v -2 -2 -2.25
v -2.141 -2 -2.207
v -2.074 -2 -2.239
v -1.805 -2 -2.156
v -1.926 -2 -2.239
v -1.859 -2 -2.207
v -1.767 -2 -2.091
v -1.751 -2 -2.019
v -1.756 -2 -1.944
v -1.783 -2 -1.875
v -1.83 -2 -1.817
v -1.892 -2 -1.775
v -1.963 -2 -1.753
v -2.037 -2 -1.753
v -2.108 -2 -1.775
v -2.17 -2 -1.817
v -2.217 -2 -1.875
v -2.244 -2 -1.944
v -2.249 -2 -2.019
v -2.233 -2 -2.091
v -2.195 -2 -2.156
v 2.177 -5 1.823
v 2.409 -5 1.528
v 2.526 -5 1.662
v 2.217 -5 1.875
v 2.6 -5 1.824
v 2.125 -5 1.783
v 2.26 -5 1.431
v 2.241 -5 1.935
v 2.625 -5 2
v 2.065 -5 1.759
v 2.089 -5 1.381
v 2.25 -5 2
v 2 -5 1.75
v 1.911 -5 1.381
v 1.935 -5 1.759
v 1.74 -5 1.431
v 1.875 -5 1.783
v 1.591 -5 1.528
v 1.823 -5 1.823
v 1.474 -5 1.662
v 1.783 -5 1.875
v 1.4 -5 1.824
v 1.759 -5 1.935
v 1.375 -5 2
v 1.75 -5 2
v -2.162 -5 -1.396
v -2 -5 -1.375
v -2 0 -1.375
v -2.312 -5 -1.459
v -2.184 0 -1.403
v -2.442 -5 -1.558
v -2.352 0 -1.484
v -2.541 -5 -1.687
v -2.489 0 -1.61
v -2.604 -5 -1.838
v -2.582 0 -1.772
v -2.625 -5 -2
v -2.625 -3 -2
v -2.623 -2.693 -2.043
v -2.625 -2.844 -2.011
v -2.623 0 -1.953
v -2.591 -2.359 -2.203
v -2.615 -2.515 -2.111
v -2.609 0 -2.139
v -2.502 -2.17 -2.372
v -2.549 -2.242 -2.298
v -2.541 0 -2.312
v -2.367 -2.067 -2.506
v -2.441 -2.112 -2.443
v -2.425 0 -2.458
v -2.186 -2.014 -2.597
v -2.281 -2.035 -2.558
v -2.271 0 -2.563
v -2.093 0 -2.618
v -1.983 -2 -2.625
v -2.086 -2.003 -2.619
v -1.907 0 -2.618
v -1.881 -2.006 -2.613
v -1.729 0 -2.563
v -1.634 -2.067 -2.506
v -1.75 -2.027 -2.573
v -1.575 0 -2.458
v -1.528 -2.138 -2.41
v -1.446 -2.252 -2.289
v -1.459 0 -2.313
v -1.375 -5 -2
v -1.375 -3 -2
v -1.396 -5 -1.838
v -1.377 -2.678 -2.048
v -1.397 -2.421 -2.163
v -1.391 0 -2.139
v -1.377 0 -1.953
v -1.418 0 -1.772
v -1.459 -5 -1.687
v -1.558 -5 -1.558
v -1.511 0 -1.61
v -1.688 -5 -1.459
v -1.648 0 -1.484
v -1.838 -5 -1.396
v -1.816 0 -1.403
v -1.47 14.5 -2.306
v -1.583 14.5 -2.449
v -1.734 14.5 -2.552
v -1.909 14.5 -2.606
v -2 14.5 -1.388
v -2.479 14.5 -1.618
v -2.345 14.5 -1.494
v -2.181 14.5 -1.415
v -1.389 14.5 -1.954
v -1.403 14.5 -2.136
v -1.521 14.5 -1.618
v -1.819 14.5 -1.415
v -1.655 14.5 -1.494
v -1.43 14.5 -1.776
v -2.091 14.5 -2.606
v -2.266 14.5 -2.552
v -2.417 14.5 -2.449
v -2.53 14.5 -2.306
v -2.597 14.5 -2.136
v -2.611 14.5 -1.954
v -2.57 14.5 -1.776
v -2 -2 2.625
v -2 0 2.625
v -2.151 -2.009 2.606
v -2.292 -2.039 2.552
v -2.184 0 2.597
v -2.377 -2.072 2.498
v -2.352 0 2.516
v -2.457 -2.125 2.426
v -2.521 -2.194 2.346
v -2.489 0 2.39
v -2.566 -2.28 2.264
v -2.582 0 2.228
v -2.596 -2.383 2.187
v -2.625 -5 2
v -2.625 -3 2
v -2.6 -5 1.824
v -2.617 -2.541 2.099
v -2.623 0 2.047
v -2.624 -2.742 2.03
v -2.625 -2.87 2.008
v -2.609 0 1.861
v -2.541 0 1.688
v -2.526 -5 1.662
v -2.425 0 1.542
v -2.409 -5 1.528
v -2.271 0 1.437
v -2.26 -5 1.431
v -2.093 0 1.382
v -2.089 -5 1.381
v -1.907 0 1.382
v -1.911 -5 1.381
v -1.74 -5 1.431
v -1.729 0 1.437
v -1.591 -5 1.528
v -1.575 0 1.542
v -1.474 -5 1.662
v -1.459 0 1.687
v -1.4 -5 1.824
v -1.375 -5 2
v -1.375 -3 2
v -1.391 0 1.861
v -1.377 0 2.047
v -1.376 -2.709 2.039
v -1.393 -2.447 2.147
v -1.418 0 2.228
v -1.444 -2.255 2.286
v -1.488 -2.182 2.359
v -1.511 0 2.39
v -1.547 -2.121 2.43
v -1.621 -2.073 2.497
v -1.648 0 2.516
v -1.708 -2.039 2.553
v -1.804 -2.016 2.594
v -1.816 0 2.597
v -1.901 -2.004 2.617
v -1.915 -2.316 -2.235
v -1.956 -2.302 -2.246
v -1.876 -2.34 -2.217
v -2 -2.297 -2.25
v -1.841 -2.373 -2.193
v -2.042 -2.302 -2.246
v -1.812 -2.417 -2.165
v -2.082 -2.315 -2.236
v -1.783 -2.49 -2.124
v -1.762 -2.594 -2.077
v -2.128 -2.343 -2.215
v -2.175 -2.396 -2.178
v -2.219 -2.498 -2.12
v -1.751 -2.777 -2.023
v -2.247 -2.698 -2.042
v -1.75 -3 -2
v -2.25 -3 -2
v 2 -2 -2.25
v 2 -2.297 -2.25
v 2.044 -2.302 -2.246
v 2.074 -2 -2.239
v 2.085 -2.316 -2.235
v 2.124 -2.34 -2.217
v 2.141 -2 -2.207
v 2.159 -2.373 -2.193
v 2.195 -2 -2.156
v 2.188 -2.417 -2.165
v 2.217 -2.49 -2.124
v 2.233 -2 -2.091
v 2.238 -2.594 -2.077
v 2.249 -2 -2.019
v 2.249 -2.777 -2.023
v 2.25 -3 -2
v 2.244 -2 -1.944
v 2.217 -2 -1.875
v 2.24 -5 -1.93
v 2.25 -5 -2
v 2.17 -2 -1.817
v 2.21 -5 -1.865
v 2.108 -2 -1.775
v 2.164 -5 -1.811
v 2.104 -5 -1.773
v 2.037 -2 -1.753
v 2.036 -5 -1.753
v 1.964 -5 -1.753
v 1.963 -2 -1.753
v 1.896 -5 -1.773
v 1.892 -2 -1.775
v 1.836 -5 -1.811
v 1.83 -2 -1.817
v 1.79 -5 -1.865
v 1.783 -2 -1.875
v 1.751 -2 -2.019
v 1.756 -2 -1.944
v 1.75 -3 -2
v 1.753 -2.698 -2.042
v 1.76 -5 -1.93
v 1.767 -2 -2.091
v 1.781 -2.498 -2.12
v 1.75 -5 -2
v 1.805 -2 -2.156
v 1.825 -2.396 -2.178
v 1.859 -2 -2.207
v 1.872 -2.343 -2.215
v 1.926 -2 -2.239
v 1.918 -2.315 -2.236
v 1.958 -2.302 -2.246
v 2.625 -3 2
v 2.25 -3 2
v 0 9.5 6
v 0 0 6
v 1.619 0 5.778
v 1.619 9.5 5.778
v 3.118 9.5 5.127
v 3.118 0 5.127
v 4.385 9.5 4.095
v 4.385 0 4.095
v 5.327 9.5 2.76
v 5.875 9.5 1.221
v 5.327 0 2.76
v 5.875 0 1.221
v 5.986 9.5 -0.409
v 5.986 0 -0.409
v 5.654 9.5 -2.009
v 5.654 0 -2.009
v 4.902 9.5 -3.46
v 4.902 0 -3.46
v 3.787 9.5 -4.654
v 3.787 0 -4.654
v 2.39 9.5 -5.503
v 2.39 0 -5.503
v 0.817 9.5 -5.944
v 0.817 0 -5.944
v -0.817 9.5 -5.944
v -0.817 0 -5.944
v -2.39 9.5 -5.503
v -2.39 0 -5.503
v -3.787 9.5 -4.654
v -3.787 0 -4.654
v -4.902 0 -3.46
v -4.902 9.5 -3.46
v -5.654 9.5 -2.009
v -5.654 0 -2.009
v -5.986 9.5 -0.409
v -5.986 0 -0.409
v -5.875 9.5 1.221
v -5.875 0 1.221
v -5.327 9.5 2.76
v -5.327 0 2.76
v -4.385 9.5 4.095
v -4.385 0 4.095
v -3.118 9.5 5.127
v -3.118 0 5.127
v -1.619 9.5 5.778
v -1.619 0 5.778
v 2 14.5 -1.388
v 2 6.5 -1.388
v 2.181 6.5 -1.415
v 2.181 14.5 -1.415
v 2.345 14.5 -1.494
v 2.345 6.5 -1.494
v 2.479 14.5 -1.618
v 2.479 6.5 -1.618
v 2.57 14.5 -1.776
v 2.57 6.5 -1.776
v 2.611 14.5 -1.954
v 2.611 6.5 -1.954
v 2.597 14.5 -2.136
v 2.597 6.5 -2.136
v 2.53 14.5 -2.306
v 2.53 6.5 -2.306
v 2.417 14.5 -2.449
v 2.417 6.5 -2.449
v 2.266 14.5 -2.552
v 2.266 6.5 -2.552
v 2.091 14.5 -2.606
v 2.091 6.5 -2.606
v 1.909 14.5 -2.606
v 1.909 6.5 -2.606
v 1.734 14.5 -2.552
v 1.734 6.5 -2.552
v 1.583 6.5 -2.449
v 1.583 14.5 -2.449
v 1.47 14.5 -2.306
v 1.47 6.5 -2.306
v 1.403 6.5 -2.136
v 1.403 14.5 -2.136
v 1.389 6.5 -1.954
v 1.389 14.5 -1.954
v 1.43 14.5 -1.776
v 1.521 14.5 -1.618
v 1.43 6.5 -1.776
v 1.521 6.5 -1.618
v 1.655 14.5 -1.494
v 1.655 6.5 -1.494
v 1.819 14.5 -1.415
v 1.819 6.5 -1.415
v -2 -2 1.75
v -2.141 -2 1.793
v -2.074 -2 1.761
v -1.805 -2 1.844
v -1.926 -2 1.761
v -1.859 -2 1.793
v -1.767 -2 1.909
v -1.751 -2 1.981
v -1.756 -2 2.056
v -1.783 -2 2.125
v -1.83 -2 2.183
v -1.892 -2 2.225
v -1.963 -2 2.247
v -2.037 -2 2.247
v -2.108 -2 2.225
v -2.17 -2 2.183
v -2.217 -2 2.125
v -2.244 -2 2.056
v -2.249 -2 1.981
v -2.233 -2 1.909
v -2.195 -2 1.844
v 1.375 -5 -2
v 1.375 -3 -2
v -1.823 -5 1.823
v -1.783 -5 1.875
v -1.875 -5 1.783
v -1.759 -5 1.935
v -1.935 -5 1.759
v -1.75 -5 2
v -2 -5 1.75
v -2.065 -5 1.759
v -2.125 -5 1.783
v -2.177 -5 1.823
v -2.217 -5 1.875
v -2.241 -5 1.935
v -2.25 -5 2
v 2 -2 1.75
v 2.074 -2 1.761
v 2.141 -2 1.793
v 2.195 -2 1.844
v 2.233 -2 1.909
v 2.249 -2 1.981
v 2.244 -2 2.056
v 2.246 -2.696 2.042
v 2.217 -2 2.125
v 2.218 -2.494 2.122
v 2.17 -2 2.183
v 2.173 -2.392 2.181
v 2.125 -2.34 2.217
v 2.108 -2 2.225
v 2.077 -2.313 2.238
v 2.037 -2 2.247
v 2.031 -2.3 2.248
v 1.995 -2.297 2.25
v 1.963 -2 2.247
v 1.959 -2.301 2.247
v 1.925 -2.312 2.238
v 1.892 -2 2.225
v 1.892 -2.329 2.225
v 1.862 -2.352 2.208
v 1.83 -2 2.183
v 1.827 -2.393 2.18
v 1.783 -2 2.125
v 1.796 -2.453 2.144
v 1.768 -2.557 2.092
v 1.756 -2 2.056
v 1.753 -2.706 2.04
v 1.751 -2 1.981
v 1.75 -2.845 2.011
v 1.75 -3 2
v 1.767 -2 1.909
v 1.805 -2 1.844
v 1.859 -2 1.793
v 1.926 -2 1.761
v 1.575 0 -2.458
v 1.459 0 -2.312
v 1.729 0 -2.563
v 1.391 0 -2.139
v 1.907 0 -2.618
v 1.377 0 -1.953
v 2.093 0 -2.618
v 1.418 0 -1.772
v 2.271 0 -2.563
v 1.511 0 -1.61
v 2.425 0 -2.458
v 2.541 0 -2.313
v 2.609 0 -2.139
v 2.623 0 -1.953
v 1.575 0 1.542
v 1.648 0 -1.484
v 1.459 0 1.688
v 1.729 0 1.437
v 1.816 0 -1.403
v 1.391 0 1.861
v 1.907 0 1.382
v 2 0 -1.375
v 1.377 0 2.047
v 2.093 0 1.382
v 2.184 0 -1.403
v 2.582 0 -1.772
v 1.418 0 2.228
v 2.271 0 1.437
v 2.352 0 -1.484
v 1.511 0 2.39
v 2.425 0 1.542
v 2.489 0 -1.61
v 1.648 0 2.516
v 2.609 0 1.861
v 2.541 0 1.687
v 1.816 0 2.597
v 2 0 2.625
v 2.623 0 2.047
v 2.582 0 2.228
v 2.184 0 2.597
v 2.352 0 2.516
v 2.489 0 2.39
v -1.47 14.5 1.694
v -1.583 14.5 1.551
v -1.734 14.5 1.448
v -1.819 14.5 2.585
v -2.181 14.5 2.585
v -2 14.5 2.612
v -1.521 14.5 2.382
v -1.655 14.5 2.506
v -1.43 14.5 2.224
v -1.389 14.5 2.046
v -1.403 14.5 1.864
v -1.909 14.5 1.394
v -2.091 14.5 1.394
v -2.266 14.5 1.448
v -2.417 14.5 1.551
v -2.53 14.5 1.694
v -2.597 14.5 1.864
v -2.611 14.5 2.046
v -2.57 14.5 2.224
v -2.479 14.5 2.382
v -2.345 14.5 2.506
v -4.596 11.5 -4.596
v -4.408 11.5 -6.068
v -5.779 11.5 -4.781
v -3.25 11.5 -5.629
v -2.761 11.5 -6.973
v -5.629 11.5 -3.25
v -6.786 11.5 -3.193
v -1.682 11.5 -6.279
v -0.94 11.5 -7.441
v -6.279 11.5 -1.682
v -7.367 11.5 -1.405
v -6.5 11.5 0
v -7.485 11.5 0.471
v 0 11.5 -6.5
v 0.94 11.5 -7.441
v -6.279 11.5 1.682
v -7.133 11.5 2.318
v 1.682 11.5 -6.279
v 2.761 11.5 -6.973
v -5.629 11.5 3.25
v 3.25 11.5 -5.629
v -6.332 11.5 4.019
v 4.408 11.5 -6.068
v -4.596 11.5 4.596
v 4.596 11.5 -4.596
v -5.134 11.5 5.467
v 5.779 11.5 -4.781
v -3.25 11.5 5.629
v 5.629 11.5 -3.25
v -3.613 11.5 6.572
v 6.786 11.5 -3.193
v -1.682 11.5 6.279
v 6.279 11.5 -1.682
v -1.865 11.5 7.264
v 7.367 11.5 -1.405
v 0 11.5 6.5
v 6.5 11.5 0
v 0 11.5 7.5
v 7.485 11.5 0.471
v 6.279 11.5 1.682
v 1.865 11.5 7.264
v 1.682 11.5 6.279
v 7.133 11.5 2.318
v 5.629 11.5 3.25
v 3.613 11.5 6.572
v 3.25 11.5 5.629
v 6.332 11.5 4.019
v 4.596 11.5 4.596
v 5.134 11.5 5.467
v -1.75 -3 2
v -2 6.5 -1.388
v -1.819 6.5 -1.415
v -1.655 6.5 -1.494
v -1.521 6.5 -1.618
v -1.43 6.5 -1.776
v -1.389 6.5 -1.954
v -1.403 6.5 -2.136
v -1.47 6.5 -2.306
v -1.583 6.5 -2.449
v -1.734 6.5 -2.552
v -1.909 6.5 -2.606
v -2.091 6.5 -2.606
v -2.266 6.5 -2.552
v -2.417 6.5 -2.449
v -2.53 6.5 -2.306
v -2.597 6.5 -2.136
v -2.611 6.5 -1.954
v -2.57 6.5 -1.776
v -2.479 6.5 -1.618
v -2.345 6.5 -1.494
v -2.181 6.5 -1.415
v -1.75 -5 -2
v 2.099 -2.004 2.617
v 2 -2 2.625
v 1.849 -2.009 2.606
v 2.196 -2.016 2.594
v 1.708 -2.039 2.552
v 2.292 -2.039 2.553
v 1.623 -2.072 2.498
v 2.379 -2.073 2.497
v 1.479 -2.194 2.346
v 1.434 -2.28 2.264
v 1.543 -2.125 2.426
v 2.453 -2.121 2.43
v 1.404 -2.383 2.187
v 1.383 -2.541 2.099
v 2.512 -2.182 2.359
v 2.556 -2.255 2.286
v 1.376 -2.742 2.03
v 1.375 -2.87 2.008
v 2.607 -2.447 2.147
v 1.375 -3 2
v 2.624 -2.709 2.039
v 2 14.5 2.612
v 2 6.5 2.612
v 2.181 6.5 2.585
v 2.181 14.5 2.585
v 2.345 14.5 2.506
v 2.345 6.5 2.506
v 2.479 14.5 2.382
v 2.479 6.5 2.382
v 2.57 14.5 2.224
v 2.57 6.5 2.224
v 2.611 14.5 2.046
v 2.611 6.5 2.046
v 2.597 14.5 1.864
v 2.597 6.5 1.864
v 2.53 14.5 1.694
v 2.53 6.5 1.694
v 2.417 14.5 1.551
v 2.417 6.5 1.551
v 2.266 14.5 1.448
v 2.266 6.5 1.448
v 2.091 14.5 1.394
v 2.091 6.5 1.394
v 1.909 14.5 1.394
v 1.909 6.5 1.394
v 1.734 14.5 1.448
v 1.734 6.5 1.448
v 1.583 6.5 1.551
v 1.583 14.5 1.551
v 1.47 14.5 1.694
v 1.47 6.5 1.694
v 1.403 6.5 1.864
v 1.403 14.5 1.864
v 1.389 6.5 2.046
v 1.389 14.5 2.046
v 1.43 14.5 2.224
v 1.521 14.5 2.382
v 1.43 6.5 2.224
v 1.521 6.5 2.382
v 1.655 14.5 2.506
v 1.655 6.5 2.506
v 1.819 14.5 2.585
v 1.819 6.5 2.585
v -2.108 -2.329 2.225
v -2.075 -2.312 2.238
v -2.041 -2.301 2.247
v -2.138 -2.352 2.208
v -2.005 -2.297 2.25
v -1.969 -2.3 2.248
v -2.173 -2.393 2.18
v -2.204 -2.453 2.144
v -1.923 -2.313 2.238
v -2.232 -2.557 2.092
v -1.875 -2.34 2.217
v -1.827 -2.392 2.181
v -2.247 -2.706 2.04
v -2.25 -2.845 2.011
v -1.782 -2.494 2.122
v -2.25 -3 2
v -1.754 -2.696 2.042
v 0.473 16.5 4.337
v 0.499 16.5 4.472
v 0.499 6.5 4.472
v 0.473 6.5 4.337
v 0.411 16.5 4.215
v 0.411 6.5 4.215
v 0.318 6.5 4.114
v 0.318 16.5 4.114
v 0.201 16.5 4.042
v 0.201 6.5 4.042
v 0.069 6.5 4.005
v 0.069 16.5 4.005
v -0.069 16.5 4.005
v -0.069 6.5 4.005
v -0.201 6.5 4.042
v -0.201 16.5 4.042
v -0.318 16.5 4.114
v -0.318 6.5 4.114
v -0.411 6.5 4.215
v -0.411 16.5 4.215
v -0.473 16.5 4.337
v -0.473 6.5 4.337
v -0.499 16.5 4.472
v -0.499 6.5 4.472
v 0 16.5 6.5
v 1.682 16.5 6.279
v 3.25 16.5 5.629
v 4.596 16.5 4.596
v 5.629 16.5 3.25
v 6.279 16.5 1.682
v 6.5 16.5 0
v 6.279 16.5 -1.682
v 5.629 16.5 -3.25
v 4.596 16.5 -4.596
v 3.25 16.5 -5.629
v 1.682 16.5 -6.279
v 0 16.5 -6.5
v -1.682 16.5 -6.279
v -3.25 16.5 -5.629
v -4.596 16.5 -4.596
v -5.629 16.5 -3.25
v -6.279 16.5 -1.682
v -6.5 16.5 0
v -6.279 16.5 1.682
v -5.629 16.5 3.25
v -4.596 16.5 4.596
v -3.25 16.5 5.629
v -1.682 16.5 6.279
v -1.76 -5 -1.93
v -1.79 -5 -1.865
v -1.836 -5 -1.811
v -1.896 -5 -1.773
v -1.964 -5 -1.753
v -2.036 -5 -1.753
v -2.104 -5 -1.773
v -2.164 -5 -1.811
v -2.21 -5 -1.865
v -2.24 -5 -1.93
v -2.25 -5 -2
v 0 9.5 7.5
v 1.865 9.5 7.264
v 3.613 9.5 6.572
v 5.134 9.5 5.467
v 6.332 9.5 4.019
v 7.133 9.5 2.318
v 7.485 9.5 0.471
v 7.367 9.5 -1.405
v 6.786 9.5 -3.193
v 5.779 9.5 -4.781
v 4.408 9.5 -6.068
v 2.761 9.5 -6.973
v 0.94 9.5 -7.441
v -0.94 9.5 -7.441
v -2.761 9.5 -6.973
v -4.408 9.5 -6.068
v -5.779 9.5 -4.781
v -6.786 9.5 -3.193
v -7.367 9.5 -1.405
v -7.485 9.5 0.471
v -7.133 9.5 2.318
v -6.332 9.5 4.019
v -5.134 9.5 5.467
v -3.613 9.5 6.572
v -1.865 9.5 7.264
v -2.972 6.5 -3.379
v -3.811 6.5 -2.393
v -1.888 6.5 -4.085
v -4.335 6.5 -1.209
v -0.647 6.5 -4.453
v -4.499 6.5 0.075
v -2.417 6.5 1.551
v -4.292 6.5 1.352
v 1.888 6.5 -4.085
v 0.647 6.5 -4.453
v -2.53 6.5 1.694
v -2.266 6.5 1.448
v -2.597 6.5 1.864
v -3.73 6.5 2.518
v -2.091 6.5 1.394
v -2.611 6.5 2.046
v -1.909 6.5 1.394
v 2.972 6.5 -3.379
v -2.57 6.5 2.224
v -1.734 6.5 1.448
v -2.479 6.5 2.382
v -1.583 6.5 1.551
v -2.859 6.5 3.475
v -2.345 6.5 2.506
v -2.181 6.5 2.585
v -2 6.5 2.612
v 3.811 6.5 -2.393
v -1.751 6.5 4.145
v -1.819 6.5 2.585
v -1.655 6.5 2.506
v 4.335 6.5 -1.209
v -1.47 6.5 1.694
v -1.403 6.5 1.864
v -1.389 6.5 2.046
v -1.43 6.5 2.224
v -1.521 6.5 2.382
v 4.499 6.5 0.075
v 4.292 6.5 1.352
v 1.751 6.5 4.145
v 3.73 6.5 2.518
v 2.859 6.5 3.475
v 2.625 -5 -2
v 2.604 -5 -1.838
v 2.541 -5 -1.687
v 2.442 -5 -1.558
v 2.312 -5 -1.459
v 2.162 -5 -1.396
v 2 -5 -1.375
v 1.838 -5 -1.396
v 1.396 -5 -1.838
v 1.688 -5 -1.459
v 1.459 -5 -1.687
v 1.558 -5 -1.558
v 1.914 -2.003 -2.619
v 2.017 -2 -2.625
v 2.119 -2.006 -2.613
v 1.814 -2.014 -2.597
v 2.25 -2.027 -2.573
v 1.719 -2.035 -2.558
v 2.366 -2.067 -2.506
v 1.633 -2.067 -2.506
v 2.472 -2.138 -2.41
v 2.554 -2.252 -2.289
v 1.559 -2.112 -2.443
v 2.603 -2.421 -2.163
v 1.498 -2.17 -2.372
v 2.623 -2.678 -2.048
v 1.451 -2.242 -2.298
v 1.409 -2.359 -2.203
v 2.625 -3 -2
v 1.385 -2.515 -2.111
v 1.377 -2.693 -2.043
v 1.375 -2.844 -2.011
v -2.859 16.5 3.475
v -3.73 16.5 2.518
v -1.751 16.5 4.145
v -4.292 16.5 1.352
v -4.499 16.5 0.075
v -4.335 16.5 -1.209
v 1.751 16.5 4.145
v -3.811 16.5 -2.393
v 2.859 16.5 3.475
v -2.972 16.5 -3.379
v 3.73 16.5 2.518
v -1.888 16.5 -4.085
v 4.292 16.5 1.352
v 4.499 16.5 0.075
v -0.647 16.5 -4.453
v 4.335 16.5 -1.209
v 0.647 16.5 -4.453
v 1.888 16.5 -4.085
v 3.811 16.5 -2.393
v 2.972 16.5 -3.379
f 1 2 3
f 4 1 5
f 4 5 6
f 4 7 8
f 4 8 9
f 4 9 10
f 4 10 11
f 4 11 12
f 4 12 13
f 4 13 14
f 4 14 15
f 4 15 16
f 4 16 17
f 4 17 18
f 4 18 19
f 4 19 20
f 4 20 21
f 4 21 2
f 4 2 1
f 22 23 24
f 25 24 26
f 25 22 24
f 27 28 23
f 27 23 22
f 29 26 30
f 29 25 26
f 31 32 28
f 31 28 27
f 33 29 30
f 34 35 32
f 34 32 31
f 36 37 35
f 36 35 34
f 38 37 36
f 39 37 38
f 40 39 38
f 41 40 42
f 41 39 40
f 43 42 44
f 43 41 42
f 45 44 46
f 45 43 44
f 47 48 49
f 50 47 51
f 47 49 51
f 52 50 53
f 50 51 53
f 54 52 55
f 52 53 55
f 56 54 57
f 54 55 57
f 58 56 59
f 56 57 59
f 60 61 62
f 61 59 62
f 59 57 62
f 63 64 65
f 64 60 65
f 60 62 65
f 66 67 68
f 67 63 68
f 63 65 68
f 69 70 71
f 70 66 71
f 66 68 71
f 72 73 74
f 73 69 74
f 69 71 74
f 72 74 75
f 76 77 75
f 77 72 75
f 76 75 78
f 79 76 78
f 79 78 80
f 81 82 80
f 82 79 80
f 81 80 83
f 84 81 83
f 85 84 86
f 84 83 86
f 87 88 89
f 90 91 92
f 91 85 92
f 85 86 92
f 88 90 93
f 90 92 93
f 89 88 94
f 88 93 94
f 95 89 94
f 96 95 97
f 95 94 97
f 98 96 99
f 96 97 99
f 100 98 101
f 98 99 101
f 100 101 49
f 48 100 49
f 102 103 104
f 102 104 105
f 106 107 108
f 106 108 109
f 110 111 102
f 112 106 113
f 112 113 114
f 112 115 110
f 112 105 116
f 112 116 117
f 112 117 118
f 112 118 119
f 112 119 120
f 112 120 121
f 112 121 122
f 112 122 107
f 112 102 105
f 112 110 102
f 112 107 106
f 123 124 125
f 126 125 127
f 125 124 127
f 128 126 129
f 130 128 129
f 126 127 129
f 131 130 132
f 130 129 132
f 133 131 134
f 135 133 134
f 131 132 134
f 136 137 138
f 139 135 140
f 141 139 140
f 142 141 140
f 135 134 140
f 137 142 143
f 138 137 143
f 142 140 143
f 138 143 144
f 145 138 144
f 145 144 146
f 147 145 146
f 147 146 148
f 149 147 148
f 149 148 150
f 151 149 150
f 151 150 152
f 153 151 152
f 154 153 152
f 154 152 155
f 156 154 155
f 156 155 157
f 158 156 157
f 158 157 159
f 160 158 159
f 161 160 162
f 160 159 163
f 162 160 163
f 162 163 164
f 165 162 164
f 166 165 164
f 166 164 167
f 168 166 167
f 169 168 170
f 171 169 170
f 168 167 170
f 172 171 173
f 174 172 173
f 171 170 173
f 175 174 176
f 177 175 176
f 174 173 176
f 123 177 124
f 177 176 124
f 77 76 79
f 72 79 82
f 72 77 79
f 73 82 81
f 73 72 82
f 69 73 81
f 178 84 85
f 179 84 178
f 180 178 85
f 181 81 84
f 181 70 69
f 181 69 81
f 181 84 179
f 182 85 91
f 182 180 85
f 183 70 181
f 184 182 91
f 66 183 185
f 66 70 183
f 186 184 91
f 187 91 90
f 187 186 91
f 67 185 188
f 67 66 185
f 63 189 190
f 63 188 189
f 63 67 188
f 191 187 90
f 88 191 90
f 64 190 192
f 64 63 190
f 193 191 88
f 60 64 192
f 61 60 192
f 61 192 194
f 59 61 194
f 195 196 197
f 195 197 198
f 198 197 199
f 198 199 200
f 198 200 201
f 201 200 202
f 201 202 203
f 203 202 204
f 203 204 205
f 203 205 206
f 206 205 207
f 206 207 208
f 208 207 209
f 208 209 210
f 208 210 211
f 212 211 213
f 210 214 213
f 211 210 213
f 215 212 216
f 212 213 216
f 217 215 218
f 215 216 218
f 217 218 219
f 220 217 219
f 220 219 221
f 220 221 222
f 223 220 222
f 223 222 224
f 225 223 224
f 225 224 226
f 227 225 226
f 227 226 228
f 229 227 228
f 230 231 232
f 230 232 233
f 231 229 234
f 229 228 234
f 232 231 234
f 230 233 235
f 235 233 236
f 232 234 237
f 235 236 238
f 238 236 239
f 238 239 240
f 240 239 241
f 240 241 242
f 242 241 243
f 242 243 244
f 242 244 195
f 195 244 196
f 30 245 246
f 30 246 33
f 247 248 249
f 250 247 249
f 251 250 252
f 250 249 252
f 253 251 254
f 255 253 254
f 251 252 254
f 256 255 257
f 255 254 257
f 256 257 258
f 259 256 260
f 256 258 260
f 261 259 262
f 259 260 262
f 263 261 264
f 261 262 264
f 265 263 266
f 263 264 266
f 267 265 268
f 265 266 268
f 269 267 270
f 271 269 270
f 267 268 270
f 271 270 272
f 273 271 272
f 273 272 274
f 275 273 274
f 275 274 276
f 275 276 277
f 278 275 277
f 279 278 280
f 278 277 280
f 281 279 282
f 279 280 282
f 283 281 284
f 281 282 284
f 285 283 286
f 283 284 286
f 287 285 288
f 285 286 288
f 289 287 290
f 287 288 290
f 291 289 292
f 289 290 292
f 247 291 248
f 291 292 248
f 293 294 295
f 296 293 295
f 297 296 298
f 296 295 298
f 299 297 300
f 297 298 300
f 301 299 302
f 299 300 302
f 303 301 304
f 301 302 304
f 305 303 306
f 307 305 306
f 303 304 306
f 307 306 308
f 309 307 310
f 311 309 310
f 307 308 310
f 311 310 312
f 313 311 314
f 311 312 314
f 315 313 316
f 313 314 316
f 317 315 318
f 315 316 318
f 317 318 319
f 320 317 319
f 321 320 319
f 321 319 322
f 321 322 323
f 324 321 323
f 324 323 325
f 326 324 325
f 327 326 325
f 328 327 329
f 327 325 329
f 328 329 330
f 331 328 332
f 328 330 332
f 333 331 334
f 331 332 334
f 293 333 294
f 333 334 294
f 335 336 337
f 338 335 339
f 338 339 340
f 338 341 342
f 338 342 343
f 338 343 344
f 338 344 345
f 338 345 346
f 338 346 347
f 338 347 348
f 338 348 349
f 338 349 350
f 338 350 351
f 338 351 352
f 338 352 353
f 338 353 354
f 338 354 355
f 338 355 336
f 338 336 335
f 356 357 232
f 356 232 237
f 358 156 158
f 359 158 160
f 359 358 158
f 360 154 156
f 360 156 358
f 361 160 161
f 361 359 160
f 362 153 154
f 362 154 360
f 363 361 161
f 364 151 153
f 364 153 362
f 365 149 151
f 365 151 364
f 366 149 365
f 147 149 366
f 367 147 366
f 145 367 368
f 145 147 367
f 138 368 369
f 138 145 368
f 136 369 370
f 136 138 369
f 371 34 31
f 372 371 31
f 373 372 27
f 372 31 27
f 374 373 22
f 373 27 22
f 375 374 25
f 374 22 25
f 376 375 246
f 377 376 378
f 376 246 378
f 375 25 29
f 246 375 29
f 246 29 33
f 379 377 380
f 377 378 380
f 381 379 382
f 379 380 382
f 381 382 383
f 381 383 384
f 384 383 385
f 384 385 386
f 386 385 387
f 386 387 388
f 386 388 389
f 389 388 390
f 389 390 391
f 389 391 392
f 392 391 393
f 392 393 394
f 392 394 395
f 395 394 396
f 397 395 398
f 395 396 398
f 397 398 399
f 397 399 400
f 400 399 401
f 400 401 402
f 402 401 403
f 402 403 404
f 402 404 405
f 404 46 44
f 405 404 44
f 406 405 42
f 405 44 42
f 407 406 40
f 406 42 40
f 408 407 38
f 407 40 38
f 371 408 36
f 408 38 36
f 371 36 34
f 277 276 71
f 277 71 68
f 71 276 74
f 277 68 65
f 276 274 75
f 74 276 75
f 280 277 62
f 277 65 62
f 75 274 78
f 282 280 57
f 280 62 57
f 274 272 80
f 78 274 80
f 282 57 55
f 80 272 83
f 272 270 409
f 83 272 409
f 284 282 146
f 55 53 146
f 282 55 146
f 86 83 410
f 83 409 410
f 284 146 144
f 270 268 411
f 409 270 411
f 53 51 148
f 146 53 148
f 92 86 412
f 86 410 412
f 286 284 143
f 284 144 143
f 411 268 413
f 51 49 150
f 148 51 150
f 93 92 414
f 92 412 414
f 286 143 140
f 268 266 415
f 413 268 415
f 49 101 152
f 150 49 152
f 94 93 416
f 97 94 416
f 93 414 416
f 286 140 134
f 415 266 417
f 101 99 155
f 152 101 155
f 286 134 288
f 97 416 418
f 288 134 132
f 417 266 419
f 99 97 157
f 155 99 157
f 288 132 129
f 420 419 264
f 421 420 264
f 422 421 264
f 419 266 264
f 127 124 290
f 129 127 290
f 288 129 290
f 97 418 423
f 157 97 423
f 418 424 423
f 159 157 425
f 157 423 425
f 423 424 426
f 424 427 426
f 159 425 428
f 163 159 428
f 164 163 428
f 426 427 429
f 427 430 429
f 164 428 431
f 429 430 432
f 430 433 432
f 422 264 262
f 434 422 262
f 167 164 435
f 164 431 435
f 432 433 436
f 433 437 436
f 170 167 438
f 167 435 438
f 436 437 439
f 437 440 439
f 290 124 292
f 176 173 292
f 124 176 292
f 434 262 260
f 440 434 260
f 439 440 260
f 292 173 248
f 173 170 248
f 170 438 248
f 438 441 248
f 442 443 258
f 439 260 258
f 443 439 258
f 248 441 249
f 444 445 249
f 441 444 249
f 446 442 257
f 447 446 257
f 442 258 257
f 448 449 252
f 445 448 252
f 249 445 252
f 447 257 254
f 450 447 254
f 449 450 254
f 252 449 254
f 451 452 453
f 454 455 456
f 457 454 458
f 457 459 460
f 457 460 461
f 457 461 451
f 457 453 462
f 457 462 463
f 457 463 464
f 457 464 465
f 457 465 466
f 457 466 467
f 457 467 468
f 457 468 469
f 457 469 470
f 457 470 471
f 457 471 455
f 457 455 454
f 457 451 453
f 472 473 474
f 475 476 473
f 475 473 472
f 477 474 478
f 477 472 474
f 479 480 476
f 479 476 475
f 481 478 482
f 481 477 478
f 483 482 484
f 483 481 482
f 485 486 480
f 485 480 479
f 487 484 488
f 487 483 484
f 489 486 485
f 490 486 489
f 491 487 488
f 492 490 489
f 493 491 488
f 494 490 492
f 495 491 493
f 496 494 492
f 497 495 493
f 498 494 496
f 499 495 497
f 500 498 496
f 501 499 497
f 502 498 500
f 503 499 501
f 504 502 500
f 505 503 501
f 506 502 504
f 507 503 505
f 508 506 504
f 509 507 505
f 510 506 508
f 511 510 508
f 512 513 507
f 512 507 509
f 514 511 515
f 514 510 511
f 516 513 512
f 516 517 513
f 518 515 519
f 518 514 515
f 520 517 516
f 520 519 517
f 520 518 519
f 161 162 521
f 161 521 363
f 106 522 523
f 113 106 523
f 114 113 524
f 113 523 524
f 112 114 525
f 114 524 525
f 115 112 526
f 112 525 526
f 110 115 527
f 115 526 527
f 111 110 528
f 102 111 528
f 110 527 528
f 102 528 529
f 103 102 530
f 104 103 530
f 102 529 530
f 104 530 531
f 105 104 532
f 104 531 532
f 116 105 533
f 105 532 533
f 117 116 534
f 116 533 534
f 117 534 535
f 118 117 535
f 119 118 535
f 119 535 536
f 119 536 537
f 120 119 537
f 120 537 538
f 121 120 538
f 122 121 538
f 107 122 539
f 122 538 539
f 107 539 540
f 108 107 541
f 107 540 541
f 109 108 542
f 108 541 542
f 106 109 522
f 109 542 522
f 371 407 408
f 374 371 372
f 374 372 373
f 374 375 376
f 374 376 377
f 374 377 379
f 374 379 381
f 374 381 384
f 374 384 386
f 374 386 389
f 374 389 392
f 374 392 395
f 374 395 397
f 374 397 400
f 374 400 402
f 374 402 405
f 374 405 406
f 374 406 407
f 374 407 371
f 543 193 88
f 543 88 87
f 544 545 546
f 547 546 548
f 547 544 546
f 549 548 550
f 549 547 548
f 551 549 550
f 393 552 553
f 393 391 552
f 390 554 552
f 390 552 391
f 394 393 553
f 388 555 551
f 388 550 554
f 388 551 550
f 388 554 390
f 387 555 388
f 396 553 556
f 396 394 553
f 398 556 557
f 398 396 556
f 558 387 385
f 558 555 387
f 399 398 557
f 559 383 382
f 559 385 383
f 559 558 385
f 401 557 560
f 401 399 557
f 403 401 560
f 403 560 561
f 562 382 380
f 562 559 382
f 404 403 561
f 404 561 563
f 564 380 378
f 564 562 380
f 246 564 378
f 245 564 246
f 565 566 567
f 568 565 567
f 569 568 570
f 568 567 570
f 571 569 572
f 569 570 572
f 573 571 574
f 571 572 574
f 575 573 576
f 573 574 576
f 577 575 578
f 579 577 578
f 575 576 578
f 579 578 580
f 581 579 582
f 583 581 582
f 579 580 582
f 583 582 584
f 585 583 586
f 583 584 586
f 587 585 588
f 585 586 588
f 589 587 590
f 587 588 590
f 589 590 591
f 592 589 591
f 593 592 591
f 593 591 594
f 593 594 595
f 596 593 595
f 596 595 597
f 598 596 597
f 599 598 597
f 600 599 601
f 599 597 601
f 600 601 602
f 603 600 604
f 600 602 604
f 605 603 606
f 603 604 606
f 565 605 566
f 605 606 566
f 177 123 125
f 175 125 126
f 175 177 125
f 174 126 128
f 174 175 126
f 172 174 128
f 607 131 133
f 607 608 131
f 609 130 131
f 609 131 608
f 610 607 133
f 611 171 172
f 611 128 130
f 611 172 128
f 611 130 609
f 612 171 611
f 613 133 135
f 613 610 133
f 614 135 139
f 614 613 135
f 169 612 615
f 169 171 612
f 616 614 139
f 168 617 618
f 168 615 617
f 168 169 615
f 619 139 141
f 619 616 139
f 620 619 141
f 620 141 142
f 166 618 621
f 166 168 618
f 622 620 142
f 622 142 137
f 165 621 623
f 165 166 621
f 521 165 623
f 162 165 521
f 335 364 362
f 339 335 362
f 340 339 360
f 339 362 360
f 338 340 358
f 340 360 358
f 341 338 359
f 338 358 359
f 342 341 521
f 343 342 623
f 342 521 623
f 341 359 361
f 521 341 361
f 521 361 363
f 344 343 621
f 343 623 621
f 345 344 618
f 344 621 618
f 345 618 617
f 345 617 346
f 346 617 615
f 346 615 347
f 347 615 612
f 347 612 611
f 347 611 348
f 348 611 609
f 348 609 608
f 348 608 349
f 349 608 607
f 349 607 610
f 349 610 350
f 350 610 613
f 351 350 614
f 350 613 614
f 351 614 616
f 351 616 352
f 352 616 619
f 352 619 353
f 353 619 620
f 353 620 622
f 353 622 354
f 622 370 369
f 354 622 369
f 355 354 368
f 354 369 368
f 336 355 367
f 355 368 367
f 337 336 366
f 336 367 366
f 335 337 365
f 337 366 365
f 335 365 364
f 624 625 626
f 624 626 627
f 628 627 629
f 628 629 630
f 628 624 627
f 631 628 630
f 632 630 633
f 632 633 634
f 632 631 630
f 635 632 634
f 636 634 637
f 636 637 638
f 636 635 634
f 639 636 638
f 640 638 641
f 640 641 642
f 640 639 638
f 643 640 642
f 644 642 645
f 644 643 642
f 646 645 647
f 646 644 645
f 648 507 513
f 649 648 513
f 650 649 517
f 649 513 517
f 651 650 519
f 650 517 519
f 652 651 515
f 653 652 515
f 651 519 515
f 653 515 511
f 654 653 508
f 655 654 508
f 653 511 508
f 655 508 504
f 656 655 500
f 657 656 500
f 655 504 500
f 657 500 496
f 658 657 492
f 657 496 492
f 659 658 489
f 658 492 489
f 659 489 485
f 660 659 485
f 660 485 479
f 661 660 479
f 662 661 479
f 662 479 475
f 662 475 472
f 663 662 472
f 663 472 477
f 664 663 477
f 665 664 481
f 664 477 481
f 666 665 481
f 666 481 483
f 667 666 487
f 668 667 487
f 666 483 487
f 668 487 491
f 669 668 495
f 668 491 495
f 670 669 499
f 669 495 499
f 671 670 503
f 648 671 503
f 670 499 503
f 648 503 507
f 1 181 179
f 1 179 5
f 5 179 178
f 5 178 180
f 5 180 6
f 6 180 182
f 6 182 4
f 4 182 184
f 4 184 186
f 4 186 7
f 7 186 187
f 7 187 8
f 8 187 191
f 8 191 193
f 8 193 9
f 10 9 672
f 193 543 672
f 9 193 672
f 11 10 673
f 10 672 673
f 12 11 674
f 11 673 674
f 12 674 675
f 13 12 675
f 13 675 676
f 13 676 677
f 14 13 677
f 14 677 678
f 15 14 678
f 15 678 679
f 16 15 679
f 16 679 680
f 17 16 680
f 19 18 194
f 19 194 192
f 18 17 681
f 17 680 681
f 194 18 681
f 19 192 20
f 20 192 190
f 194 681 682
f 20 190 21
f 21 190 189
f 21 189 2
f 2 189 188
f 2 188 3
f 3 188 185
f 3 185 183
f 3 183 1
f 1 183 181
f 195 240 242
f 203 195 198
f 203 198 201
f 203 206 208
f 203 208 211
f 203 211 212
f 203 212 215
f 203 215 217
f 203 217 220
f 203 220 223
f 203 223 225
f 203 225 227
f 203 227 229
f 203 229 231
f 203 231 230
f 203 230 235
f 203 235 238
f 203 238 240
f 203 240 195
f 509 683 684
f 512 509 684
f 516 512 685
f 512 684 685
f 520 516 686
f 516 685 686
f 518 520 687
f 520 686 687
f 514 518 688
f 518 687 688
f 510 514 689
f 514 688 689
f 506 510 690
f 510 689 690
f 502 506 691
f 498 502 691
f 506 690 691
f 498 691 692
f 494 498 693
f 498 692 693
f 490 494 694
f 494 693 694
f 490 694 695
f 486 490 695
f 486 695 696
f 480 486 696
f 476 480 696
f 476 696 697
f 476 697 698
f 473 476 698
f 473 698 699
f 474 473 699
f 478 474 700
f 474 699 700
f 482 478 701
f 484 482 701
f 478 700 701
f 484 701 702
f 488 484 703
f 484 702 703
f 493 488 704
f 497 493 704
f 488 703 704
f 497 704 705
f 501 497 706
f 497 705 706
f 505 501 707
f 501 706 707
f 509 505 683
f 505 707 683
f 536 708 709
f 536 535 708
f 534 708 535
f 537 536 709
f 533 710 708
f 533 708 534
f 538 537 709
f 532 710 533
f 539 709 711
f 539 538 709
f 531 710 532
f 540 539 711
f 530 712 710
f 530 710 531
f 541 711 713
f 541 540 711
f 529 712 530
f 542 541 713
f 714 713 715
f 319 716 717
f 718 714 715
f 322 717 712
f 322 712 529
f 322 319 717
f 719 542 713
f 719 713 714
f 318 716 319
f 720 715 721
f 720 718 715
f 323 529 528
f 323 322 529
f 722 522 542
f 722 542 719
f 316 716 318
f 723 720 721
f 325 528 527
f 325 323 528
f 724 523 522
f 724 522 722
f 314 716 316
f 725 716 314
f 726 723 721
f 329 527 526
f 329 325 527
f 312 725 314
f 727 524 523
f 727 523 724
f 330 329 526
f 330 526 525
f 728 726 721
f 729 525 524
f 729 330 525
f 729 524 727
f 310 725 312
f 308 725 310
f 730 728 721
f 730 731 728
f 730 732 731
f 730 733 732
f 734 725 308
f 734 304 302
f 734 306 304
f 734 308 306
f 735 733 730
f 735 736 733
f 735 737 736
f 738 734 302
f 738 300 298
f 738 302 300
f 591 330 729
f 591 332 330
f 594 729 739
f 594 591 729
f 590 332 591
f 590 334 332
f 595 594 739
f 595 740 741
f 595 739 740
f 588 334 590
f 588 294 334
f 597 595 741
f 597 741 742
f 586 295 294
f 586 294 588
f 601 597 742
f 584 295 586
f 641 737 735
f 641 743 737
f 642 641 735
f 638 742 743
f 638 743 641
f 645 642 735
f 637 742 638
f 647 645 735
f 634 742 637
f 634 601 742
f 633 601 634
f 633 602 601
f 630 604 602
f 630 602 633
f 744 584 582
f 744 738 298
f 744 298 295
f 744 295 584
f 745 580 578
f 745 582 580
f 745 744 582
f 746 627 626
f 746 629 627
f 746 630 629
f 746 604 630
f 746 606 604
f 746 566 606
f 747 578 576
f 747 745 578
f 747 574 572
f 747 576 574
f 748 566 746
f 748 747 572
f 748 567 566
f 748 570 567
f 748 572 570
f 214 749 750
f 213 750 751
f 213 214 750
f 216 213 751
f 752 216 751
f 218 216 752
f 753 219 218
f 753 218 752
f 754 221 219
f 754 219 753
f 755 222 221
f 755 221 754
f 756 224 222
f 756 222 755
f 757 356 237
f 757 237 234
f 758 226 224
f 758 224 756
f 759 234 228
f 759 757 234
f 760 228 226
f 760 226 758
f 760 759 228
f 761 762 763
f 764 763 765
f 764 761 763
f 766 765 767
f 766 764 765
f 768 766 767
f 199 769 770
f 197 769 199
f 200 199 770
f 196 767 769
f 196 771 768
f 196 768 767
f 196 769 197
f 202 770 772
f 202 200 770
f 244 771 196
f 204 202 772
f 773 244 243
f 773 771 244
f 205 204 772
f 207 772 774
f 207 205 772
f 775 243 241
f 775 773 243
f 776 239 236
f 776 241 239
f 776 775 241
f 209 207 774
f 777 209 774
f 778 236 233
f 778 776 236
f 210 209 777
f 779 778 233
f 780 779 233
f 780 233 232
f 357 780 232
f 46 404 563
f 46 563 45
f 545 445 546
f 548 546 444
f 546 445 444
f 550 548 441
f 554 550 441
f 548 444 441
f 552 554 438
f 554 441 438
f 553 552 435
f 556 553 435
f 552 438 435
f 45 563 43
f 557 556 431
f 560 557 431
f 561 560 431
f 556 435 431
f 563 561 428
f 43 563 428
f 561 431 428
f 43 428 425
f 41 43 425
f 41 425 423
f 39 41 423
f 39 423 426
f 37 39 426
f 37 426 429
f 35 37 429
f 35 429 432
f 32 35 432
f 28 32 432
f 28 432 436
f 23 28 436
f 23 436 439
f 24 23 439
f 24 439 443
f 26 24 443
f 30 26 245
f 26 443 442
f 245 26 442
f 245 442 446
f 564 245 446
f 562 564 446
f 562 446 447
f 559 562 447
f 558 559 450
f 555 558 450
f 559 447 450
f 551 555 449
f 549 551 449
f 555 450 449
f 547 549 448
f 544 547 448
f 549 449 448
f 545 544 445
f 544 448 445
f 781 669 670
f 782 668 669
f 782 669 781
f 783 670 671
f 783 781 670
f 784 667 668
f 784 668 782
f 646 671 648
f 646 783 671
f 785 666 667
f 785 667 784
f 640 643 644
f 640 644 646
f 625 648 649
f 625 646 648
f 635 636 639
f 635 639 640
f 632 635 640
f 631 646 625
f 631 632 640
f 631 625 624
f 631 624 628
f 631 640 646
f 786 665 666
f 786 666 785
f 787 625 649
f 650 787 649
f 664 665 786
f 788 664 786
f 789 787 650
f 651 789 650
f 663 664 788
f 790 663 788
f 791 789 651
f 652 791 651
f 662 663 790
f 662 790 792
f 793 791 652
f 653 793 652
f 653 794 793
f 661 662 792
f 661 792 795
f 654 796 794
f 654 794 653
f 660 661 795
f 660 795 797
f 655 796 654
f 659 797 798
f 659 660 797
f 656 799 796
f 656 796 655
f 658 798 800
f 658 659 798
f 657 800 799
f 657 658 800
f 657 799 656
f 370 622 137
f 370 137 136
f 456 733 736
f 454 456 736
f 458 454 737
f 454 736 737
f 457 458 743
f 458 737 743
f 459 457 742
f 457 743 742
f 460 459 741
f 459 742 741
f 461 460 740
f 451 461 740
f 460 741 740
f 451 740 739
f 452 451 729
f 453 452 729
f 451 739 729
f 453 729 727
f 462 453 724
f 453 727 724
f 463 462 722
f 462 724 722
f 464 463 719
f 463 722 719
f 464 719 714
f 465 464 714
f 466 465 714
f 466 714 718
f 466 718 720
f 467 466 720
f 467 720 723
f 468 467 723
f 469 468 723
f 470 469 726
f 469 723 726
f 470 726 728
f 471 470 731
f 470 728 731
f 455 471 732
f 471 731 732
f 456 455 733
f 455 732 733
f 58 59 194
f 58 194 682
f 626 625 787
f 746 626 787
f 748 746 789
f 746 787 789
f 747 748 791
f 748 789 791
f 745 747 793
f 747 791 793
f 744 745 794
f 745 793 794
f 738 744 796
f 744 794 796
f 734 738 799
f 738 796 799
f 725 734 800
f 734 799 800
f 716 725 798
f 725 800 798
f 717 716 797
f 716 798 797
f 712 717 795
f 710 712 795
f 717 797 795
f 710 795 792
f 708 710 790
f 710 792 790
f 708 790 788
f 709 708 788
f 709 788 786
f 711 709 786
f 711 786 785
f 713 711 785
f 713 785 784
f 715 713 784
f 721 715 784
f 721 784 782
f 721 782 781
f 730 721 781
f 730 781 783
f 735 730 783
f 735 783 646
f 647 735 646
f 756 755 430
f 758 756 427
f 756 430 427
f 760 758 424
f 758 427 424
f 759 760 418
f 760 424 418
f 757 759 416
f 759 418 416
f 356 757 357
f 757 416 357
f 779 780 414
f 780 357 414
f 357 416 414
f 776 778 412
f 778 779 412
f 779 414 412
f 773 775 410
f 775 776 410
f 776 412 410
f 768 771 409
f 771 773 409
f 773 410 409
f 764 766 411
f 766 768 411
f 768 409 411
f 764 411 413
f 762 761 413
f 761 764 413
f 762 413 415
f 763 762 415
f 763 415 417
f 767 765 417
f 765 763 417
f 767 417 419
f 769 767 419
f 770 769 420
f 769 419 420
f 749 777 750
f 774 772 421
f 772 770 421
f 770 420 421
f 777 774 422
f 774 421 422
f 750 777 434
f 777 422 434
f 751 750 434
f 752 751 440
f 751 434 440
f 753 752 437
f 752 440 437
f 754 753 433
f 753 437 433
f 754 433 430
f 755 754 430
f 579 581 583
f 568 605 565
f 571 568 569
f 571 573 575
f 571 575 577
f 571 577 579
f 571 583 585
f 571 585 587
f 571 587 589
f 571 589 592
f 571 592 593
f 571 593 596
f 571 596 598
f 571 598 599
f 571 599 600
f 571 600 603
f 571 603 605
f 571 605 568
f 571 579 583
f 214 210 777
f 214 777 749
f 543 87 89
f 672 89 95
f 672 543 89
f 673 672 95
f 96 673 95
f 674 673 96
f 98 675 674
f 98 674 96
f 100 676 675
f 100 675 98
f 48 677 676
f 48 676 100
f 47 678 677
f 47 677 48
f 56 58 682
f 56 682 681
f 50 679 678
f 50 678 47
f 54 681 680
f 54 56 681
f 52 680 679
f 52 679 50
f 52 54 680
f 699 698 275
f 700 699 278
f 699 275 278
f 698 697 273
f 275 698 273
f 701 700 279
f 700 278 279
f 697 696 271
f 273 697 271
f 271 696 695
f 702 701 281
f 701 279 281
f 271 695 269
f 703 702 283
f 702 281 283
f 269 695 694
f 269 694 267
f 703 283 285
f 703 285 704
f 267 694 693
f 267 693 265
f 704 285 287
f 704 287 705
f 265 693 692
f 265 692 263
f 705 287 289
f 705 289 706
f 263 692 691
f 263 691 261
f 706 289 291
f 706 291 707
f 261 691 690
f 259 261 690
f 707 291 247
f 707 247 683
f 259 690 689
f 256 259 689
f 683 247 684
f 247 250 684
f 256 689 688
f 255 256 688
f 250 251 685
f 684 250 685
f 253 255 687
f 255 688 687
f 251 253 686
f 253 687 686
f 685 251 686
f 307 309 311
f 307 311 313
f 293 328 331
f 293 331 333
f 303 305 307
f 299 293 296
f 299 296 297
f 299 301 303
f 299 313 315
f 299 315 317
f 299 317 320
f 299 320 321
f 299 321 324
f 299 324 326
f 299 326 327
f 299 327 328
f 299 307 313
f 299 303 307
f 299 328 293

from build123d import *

# Parameters (mm, degrees)
SKETCH_1_R          = 6
EXTRUDE_1_DEPTH     = 9.5
SKETCH_2_R          = 7.5
EXTRUDE_2_DEPTH     = 2
SKETCH_3_R          = 6.5
EXTRUDE_3_DEPTH     = 5
SKETCH_4_R          = 4.5
CUT_EXTRUDE_1_DEPTH = 10
EXTRUDE_START       = 10
EXTRUDE_4_DEPTH     = 10
SKETCH_6_R          = 0.6125
EXTRUDE_5_DEPTH     = 8
SKETCH_7_R          = 0.625
EXTRUDE_6_DEPTH     = 5
SKETCH_8_R          = 0.25
CUT_EXTRUDE_2_DEPTH = 3
CUT_EXTRUDE_3_DEPTH = 10


with BuildPart() as part:
    # Эскиз1 → Бобышка-Вытянуть1 (new body)
    with BuildSketch(Plane(origin=(0, 0, 0), x_dir=(1, 0, 0), z_dir=(0, 1, 0))):
        with Locations(Location((0, 0, 0), (0, 0, 270))):
            Circle(SKETCH_1_R)
    extrude(amount=EXTRUDE_1_DEPTH)

    # Эскиз2 → Бобышка-Вытянуть2 (add)
    with BuildSketch(Plane(origin=(0, 9.5, 0), x_dir=(1, 0, 0), z_dir=(0, 1, 0))):
        with Locations(Location((0, 0, 0), (0, 0, 270))):
            Circle(SKETCH_2_R)
    extrude(amount=EXTRUDE_2_DEPTH)

    # Эскиз3 → Бобышка-Вытянуть3 (add)
    with BuildSketch(Plane(origin=(0, 11.5, 0), x_dir=(1, 0, 0), z_dir=(0, 1, 0))):
        with Locations(Location((0, 0, 0), (0, 0, 270))):
            Circle(SKETCH_3_R)
    extrude(amount=EXTRUDE_3_DEPTH)

    # Эскиз4 → Вырез-Вытянуть1 (cut)
    with BuildSketch(Plane(origin=(0, 16.5, 0), x_dir=(1, 0, 0), z_dir=(0, 1, 0))):
        with Locations(Location((0, 0, 0), (0, 0, 270))):
            Circle(SKETCH_4_R)
    extrude(amount=-CUT_EXTRUDE_1_DEPTH, mode=Mode.SUBTRACT)

    # Эскиз5 → Бобышка-Вытянуть4 (add)
    with BuildSketch(Plane(origin=(0, 6.5, 0), x_dir=(1, 0, 0), z_dir=(0, 1, 0)).offset(EXTRUDE_START)):
        with BuildLine():
            ThreePointArc((-0.499227799, -4.472222222), (0, -4.5), (0.499227799, -4.472222222))
            ThreePointArc((0.499227799, -4.472222222), (0, -4), (-0.499227799, -4.472222222))
        make_face()
    extrude(amount=-EXTRUDE_4_DEPTH)

    # Эскиз6 → Бобышка-Вытянуть5 (add)
    with BuildSketch(Plane(origin=(0, 6.5, 0), x_dir=(1, 0, 0), z_dir=(0, 1, 0))):
        with Locations(Location((-2, 2, 0), (0, 0, 270))):
            Circle(SKETCH_6_R)
        with Locations(Location((-2, -2, 0), (0, 0, 270))):
            Circle(SKETCH_6_R)
        with Locations(Location((2, -2, 0), (0, 0, 270))):
            Circle(SKETCH_6_R)
        with Locations(Location((2, 2, 0), (0, 0, 270))):
            Circle(SKETCH_6_R)
    extrude(amount=EXTRUDE_5_DEPTH)

    # Эскиз7 → Бобышка-Вытянуть6 (add)
    with BuildSketch(Plane.XZ):
        with Locations(Location((2, -2, 0), (0, 0, 90))):
            Circle(SKETCH_7_R)
        with Locations(Location((-2, -2, 0), (0, 0, 90))):
            Circle(SKETCH_7_R)
        with Locations(Location((-2, 2, 0), (0, 0, 90))):
            Circle(SKETCH_7_R)
        with Locations(Location((2, 2, 0), (0, 0, 90))):
            Circle(SKETCH_7_R)
    extrude(amount=EXTRUDE_6_DEPTH)

    # Эскиз8 → Вырез-Вытянуть2 (cut)
    with BuildSketch(Plane.XZ.offset(5)):
        with Locations(Location((2, -2, 0), (0, 0, 270))):
            Circle(SKETCH_8_R)
        with Locations(Location((-2, -2, 0), (0, 0, 270))):
            Circle(SKETCH_8_R)
        with Locations(Location((-2, 2, 0), (0, 0, 270))):
            Circle(SKETCH_8_R)
        with Locations(Location((2, 2, 0), (0, 0, 270))):
            Circle(SKETCH_8_R)
    extrude(amount=-CUT_EXTRUDE_2_DEPTH, mode=Mode.SUBTRACT)

    # Эскиз9 → Вырез-Вытянуть3 (cut, symmetric)
    with BuildSketch(Plane(origin=(0, 0, 0), x_dir=(0, 0, -1), z_dir=(1, 0, 0))):
        with BuildLine():
            Line((2, -5), (2.625, -5))
            Line((2.625, -5), (2.625, -2))
            ThreePointArc((2.625, -2), (2.169101887, -2.410376179), (2, -3))
            Line((2, -3), (2, -5))
        make_face()
        with BuildLine():
            Line((-2, -5), (-2.625, -5))
            Line((-2.625, -5), (-2.625, -2))
            ThreePointArc((-2.625, -2), (-2.169101887, -2.410376179), (-2, -3))
            Line((-2, -3), (-2, -5))
        make_face()
    extrude(amount=CUT_EXTRUDE_3_DEPTH, both=True, mode=Mode.SUBTRACT)


solid = part.part
